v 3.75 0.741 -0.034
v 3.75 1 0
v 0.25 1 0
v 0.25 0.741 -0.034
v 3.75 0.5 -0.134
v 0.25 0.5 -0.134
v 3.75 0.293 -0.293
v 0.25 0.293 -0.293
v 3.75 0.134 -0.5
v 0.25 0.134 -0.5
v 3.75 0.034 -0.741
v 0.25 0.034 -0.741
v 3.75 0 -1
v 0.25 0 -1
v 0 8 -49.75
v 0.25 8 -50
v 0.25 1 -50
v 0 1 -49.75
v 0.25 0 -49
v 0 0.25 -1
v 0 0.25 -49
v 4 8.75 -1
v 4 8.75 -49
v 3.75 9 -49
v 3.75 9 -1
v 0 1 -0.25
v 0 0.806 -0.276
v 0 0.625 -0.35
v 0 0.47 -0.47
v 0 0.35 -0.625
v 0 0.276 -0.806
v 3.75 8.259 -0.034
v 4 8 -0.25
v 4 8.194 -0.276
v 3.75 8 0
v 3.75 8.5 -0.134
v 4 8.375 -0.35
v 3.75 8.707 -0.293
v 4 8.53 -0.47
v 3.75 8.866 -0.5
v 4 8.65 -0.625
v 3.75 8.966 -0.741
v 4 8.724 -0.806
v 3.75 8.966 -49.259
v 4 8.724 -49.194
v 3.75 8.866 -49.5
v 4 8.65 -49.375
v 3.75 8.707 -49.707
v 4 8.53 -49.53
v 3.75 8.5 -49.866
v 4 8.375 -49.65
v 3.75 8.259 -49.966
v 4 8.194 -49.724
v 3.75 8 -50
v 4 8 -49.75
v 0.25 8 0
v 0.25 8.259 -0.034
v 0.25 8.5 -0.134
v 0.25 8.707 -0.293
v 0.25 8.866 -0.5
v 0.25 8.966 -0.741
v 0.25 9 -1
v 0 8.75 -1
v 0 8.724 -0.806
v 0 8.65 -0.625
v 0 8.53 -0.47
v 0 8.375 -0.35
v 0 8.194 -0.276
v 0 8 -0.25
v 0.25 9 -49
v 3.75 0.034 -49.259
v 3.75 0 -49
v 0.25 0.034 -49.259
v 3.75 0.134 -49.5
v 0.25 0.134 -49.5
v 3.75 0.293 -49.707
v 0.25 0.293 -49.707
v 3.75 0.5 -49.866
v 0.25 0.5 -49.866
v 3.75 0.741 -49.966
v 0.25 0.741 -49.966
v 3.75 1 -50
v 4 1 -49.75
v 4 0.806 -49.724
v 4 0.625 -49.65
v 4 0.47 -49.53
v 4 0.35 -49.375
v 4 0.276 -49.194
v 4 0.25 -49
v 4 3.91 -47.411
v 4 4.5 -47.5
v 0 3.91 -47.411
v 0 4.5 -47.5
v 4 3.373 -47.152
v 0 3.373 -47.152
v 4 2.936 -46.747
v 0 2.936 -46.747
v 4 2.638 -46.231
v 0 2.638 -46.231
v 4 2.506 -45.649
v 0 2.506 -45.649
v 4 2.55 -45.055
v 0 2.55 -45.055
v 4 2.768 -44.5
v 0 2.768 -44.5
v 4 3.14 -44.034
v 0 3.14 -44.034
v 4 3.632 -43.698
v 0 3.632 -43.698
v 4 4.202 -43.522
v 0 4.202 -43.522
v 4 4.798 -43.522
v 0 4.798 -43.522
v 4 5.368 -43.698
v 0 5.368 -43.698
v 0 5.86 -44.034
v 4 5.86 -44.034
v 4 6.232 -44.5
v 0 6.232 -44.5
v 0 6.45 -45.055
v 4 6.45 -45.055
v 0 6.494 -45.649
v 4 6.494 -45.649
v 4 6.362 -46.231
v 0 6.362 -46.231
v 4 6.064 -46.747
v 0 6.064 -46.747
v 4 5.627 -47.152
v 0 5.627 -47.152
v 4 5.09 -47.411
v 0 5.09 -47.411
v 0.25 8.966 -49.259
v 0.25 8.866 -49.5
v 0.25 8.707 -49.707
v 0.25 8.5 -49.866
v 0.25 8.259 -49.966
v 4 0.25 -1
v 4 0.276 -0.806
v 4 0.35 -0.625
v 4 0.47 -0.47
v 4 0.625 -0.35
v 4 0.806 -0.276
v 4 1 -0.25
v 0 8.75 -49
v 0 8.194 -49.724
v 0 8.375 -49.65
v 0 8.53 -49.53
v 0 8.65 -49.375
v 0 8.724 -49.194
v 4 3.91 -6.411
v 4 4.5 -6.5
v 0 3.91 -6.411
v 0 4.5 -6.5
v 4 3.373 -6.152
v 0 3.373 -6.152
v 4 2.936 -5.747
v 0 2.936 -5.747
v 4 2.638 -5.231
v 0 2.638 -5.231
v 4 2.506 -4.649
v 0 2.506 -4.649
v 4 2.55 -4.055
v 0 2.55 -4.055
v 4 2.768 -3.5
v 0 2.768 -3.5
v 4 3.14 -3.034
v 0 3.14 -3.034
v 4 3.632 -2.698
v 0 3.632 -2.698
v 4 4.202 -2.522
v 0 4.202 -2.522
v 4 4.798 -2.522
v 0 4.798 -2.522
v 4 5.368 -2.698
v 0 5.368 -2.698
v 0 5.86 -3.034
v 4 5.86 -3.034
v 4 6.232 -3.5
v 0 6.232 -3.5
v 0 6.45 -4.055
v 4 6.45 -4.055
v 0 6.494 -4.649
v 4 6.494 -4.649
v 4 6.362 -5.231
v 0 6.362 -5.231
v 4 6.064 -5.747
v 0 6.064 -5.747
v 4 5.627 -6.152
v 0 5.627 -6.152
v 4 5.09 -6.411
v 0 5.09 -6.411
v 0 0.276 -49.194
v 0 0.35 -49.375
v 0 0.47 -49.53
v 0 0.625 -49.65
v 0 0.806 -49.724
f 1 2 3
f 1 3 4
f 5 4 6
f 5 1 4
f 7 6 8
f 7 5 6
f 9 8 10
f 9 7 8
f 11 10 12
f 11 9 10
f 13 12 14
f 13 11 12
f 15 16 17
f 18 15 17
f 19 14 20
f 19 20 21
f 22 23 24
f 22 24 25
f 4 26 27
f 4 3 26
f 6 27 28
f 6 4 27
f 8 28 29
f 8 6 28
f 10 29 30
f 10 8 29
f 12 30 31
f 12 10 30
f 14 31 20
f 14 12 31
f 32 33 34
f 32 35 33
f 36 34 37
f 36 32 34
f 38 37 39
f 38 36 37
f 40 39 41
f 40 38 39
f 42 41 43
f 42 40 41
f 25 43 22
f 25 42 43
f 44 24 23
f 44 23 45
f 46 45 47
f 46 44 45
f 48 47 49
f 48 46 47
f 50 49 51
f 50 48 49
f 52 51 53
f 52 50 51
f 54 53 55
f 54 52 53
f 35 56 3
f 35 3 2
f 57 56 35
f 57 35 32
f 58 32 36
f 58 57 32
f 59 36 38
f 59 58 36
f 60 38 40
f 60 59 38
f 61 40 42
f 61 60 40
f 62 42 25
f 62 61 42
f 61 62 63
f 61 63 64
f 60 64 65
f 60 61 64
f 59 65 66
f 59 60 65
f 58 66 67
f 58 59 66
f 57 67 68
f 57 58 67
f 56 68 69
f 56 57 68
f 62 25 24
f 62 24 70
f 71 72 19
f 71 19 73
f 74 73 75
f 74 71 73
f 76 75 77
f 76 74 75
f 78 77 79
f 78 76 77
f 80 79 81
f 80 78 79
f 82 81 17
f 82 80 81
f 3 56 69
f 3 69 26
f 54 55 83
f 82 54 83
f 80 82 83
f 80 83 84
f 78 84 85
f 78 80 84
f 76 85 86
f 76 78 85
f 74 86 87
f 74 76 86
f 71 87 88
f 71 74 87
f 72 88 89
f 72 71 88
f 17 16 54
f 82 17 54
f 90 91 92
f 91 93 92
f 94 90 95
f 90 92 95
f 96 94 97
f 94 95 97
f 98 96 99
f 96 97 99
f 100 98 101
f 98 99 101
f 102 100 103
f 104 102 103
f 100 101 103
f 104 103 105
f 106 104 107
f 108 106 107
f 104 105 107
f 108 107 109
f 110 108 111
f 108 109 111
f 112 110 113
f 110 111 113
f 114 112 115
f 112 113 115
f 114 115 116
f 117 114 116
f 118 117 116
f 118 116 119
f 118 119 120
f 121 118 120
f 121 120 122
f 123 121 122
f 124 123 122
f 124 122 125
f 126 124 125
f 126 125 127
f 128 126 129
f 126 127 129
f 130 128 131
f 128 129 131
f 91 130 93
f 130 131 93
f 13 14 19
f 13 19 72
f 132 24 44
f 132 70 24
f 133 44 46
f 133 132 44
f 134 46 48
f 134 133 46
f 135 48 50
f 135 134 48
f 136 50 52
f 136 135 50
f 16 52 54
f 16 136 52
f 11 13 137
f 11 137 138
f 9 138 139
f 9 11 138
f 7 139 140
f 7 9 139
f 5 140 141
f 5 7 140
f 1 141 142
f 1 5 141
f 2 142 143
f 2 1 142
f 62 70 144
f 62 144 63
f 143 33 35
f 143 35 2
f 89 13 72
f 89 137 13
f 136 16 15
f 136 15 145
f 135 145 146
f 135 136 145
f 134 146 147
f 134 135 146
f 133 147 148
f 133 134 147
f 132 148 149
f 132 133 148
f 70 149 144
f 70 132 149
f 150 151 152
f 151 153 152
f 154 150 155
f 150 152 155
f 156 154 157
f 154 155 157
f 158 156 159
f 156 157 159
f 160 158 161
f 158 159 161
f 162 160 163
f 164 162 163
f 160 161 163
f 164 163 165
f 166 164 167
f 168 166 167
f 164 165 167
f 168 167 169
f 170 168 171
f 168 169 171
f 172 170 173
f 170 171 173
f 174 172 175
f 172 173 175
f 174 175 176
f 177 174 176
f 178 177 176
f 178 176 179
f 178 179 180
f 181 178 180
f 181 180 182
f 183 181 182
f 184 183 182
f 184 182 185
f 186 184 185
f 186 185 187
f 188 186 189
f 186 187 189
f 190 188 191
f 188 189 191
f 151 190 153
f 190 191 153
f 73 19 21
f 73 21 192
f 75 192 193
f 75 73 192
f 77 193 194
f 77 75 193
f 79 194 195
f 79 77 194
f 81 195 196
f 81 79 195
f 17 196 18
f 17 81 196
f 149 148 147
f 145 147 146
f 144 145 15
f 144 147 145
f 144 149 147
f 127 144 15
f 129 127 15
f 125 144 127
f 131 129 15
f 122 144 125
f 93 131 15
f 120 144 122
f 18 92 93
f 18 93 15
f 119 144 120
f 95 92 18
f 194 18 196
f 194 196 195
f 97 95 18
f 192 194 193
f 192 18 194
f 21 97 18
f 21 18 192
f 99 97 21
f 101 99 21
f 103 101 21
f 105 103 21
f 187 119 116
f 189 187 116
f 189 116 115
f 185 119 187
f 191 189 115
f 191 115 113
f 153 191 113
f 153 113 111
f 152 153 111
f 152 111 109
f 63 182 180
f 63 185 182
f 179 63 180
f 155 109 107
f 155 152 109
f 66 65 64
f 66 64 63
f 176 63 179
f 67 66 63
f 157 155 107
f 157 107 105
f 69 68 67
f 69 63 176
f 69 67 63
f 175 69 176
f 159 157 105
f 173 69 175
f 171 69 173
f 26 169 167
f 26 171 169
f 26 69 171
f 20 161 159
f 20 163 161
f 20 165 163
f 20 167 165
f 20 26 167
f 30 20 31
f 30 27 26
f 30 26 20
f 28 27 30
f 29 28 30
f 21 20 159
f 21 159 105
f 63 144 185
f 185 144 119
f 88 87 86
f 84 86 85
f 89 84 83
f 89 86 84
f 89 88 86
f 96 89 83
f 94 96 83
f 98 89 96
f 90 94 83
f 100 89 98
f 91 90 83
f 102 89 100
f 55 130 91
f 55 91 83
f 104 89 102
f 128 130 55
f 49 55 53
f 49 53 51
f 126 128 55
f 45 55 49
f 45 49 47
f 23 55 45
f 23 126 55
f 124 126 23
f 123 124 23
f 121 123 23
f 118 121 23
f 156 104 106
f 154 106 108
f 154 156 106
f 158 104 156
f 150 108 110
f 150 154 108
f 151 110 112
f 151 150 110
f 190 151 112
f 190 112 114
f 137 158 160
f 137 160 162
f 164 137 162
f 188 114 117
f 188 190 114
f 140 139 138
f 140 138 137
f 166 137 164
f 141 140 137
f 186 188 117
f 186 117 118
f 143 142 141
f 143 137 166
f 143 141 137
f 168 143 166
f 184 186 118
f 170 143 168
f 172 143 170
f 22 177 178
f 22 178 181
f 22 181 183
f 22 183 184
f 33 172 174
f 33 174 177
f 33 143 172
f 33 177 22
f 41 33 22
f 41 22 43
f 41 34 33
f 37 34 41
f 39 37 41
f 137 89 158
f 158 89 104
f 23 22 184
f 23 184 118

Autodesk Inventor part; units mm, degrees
ref_plane "YZ Plane" through (0, 0, 0) normal (1, 0, 0) x (0, 1, 0)
ref_plane "XZ Plane" through (0, 0, 0) normal (0, 1, 0) x (-1, 0, 0)
ref_plane "XY Plane" through (0, 0, 0) normal (0, 0, 1) x (1, 0, 0)
sketch "Sketch1" plane through (0, 0, 0) normal (0, 0, 1) x (1, 0, 0)
  line L0 (0, 0) -> (4, 0)
  line L1 (4, 0) -> (4, 9)
  line L2 (4, 9) -> (0, 9)
  line L3 (0, 9) -> (0, 0)
  dimension "d3" = 4
  dimension "d4" = 9
extrude "Extrusion1" add sketch "Sketch1" against normal blind 50
sketch "Sketch2" plane through (4, 0, 0) normal (1, 0, 0) x (0, 0, -1)
  circle A0 centre (4.5, 4.5) radius 2
  circle A1 centre (45.5, 4.5) radius 2
  line L0 (0, 0) -> (50, 0) projected
  line L1 (0, 0) -> (0, 9) projected
  line L2 (50, 9) -> (50, 0) projected
  line L3 (0, 9) -> (50, 9) projected
  dimension "d7" = 4
  dimension "d8" = 4
  dimension "d9" = 4.5
  dimension "d10" = 4.5
  dimension "d11" = 41
  dimension "d12" = 4.5
  dimension "d13" = 4.5
hole "Hole1" at (4, 4.5, -4.5) at (4, 4.5, -45.5) direction (-1, 0, 0) diameter 4 depth 4 tip angle 118
fillet "Fillet1" radius 1 4 edges at (2, 9, 0) (2, 0, 0) (2, 9, -50) (2, 0, -50)
chamfer "Chamfer1" distance 0.25 angle 45 16 edges at (0, 9, -25) (0, 8.7071, -49.7071) (0, 4.5, -50) (0, 0.2929, -49.7071) (0, 0, -25) (0, 0.2929, -0.2929) (0, 4.5, 0) (0, 8.7071, -0.2929) (4, 0, -25) (4, 0.2929, -49.7071) (4, 4.5, -50) (4, 8.7071, -49.7071) (4, 9, -25) (4, 8.7071, -0.2929) (4, 4.5, 0) (4, 0.2929, -0.2929)
properties part number "HUDSON 1-03 AXLE BOX KEEPER"
